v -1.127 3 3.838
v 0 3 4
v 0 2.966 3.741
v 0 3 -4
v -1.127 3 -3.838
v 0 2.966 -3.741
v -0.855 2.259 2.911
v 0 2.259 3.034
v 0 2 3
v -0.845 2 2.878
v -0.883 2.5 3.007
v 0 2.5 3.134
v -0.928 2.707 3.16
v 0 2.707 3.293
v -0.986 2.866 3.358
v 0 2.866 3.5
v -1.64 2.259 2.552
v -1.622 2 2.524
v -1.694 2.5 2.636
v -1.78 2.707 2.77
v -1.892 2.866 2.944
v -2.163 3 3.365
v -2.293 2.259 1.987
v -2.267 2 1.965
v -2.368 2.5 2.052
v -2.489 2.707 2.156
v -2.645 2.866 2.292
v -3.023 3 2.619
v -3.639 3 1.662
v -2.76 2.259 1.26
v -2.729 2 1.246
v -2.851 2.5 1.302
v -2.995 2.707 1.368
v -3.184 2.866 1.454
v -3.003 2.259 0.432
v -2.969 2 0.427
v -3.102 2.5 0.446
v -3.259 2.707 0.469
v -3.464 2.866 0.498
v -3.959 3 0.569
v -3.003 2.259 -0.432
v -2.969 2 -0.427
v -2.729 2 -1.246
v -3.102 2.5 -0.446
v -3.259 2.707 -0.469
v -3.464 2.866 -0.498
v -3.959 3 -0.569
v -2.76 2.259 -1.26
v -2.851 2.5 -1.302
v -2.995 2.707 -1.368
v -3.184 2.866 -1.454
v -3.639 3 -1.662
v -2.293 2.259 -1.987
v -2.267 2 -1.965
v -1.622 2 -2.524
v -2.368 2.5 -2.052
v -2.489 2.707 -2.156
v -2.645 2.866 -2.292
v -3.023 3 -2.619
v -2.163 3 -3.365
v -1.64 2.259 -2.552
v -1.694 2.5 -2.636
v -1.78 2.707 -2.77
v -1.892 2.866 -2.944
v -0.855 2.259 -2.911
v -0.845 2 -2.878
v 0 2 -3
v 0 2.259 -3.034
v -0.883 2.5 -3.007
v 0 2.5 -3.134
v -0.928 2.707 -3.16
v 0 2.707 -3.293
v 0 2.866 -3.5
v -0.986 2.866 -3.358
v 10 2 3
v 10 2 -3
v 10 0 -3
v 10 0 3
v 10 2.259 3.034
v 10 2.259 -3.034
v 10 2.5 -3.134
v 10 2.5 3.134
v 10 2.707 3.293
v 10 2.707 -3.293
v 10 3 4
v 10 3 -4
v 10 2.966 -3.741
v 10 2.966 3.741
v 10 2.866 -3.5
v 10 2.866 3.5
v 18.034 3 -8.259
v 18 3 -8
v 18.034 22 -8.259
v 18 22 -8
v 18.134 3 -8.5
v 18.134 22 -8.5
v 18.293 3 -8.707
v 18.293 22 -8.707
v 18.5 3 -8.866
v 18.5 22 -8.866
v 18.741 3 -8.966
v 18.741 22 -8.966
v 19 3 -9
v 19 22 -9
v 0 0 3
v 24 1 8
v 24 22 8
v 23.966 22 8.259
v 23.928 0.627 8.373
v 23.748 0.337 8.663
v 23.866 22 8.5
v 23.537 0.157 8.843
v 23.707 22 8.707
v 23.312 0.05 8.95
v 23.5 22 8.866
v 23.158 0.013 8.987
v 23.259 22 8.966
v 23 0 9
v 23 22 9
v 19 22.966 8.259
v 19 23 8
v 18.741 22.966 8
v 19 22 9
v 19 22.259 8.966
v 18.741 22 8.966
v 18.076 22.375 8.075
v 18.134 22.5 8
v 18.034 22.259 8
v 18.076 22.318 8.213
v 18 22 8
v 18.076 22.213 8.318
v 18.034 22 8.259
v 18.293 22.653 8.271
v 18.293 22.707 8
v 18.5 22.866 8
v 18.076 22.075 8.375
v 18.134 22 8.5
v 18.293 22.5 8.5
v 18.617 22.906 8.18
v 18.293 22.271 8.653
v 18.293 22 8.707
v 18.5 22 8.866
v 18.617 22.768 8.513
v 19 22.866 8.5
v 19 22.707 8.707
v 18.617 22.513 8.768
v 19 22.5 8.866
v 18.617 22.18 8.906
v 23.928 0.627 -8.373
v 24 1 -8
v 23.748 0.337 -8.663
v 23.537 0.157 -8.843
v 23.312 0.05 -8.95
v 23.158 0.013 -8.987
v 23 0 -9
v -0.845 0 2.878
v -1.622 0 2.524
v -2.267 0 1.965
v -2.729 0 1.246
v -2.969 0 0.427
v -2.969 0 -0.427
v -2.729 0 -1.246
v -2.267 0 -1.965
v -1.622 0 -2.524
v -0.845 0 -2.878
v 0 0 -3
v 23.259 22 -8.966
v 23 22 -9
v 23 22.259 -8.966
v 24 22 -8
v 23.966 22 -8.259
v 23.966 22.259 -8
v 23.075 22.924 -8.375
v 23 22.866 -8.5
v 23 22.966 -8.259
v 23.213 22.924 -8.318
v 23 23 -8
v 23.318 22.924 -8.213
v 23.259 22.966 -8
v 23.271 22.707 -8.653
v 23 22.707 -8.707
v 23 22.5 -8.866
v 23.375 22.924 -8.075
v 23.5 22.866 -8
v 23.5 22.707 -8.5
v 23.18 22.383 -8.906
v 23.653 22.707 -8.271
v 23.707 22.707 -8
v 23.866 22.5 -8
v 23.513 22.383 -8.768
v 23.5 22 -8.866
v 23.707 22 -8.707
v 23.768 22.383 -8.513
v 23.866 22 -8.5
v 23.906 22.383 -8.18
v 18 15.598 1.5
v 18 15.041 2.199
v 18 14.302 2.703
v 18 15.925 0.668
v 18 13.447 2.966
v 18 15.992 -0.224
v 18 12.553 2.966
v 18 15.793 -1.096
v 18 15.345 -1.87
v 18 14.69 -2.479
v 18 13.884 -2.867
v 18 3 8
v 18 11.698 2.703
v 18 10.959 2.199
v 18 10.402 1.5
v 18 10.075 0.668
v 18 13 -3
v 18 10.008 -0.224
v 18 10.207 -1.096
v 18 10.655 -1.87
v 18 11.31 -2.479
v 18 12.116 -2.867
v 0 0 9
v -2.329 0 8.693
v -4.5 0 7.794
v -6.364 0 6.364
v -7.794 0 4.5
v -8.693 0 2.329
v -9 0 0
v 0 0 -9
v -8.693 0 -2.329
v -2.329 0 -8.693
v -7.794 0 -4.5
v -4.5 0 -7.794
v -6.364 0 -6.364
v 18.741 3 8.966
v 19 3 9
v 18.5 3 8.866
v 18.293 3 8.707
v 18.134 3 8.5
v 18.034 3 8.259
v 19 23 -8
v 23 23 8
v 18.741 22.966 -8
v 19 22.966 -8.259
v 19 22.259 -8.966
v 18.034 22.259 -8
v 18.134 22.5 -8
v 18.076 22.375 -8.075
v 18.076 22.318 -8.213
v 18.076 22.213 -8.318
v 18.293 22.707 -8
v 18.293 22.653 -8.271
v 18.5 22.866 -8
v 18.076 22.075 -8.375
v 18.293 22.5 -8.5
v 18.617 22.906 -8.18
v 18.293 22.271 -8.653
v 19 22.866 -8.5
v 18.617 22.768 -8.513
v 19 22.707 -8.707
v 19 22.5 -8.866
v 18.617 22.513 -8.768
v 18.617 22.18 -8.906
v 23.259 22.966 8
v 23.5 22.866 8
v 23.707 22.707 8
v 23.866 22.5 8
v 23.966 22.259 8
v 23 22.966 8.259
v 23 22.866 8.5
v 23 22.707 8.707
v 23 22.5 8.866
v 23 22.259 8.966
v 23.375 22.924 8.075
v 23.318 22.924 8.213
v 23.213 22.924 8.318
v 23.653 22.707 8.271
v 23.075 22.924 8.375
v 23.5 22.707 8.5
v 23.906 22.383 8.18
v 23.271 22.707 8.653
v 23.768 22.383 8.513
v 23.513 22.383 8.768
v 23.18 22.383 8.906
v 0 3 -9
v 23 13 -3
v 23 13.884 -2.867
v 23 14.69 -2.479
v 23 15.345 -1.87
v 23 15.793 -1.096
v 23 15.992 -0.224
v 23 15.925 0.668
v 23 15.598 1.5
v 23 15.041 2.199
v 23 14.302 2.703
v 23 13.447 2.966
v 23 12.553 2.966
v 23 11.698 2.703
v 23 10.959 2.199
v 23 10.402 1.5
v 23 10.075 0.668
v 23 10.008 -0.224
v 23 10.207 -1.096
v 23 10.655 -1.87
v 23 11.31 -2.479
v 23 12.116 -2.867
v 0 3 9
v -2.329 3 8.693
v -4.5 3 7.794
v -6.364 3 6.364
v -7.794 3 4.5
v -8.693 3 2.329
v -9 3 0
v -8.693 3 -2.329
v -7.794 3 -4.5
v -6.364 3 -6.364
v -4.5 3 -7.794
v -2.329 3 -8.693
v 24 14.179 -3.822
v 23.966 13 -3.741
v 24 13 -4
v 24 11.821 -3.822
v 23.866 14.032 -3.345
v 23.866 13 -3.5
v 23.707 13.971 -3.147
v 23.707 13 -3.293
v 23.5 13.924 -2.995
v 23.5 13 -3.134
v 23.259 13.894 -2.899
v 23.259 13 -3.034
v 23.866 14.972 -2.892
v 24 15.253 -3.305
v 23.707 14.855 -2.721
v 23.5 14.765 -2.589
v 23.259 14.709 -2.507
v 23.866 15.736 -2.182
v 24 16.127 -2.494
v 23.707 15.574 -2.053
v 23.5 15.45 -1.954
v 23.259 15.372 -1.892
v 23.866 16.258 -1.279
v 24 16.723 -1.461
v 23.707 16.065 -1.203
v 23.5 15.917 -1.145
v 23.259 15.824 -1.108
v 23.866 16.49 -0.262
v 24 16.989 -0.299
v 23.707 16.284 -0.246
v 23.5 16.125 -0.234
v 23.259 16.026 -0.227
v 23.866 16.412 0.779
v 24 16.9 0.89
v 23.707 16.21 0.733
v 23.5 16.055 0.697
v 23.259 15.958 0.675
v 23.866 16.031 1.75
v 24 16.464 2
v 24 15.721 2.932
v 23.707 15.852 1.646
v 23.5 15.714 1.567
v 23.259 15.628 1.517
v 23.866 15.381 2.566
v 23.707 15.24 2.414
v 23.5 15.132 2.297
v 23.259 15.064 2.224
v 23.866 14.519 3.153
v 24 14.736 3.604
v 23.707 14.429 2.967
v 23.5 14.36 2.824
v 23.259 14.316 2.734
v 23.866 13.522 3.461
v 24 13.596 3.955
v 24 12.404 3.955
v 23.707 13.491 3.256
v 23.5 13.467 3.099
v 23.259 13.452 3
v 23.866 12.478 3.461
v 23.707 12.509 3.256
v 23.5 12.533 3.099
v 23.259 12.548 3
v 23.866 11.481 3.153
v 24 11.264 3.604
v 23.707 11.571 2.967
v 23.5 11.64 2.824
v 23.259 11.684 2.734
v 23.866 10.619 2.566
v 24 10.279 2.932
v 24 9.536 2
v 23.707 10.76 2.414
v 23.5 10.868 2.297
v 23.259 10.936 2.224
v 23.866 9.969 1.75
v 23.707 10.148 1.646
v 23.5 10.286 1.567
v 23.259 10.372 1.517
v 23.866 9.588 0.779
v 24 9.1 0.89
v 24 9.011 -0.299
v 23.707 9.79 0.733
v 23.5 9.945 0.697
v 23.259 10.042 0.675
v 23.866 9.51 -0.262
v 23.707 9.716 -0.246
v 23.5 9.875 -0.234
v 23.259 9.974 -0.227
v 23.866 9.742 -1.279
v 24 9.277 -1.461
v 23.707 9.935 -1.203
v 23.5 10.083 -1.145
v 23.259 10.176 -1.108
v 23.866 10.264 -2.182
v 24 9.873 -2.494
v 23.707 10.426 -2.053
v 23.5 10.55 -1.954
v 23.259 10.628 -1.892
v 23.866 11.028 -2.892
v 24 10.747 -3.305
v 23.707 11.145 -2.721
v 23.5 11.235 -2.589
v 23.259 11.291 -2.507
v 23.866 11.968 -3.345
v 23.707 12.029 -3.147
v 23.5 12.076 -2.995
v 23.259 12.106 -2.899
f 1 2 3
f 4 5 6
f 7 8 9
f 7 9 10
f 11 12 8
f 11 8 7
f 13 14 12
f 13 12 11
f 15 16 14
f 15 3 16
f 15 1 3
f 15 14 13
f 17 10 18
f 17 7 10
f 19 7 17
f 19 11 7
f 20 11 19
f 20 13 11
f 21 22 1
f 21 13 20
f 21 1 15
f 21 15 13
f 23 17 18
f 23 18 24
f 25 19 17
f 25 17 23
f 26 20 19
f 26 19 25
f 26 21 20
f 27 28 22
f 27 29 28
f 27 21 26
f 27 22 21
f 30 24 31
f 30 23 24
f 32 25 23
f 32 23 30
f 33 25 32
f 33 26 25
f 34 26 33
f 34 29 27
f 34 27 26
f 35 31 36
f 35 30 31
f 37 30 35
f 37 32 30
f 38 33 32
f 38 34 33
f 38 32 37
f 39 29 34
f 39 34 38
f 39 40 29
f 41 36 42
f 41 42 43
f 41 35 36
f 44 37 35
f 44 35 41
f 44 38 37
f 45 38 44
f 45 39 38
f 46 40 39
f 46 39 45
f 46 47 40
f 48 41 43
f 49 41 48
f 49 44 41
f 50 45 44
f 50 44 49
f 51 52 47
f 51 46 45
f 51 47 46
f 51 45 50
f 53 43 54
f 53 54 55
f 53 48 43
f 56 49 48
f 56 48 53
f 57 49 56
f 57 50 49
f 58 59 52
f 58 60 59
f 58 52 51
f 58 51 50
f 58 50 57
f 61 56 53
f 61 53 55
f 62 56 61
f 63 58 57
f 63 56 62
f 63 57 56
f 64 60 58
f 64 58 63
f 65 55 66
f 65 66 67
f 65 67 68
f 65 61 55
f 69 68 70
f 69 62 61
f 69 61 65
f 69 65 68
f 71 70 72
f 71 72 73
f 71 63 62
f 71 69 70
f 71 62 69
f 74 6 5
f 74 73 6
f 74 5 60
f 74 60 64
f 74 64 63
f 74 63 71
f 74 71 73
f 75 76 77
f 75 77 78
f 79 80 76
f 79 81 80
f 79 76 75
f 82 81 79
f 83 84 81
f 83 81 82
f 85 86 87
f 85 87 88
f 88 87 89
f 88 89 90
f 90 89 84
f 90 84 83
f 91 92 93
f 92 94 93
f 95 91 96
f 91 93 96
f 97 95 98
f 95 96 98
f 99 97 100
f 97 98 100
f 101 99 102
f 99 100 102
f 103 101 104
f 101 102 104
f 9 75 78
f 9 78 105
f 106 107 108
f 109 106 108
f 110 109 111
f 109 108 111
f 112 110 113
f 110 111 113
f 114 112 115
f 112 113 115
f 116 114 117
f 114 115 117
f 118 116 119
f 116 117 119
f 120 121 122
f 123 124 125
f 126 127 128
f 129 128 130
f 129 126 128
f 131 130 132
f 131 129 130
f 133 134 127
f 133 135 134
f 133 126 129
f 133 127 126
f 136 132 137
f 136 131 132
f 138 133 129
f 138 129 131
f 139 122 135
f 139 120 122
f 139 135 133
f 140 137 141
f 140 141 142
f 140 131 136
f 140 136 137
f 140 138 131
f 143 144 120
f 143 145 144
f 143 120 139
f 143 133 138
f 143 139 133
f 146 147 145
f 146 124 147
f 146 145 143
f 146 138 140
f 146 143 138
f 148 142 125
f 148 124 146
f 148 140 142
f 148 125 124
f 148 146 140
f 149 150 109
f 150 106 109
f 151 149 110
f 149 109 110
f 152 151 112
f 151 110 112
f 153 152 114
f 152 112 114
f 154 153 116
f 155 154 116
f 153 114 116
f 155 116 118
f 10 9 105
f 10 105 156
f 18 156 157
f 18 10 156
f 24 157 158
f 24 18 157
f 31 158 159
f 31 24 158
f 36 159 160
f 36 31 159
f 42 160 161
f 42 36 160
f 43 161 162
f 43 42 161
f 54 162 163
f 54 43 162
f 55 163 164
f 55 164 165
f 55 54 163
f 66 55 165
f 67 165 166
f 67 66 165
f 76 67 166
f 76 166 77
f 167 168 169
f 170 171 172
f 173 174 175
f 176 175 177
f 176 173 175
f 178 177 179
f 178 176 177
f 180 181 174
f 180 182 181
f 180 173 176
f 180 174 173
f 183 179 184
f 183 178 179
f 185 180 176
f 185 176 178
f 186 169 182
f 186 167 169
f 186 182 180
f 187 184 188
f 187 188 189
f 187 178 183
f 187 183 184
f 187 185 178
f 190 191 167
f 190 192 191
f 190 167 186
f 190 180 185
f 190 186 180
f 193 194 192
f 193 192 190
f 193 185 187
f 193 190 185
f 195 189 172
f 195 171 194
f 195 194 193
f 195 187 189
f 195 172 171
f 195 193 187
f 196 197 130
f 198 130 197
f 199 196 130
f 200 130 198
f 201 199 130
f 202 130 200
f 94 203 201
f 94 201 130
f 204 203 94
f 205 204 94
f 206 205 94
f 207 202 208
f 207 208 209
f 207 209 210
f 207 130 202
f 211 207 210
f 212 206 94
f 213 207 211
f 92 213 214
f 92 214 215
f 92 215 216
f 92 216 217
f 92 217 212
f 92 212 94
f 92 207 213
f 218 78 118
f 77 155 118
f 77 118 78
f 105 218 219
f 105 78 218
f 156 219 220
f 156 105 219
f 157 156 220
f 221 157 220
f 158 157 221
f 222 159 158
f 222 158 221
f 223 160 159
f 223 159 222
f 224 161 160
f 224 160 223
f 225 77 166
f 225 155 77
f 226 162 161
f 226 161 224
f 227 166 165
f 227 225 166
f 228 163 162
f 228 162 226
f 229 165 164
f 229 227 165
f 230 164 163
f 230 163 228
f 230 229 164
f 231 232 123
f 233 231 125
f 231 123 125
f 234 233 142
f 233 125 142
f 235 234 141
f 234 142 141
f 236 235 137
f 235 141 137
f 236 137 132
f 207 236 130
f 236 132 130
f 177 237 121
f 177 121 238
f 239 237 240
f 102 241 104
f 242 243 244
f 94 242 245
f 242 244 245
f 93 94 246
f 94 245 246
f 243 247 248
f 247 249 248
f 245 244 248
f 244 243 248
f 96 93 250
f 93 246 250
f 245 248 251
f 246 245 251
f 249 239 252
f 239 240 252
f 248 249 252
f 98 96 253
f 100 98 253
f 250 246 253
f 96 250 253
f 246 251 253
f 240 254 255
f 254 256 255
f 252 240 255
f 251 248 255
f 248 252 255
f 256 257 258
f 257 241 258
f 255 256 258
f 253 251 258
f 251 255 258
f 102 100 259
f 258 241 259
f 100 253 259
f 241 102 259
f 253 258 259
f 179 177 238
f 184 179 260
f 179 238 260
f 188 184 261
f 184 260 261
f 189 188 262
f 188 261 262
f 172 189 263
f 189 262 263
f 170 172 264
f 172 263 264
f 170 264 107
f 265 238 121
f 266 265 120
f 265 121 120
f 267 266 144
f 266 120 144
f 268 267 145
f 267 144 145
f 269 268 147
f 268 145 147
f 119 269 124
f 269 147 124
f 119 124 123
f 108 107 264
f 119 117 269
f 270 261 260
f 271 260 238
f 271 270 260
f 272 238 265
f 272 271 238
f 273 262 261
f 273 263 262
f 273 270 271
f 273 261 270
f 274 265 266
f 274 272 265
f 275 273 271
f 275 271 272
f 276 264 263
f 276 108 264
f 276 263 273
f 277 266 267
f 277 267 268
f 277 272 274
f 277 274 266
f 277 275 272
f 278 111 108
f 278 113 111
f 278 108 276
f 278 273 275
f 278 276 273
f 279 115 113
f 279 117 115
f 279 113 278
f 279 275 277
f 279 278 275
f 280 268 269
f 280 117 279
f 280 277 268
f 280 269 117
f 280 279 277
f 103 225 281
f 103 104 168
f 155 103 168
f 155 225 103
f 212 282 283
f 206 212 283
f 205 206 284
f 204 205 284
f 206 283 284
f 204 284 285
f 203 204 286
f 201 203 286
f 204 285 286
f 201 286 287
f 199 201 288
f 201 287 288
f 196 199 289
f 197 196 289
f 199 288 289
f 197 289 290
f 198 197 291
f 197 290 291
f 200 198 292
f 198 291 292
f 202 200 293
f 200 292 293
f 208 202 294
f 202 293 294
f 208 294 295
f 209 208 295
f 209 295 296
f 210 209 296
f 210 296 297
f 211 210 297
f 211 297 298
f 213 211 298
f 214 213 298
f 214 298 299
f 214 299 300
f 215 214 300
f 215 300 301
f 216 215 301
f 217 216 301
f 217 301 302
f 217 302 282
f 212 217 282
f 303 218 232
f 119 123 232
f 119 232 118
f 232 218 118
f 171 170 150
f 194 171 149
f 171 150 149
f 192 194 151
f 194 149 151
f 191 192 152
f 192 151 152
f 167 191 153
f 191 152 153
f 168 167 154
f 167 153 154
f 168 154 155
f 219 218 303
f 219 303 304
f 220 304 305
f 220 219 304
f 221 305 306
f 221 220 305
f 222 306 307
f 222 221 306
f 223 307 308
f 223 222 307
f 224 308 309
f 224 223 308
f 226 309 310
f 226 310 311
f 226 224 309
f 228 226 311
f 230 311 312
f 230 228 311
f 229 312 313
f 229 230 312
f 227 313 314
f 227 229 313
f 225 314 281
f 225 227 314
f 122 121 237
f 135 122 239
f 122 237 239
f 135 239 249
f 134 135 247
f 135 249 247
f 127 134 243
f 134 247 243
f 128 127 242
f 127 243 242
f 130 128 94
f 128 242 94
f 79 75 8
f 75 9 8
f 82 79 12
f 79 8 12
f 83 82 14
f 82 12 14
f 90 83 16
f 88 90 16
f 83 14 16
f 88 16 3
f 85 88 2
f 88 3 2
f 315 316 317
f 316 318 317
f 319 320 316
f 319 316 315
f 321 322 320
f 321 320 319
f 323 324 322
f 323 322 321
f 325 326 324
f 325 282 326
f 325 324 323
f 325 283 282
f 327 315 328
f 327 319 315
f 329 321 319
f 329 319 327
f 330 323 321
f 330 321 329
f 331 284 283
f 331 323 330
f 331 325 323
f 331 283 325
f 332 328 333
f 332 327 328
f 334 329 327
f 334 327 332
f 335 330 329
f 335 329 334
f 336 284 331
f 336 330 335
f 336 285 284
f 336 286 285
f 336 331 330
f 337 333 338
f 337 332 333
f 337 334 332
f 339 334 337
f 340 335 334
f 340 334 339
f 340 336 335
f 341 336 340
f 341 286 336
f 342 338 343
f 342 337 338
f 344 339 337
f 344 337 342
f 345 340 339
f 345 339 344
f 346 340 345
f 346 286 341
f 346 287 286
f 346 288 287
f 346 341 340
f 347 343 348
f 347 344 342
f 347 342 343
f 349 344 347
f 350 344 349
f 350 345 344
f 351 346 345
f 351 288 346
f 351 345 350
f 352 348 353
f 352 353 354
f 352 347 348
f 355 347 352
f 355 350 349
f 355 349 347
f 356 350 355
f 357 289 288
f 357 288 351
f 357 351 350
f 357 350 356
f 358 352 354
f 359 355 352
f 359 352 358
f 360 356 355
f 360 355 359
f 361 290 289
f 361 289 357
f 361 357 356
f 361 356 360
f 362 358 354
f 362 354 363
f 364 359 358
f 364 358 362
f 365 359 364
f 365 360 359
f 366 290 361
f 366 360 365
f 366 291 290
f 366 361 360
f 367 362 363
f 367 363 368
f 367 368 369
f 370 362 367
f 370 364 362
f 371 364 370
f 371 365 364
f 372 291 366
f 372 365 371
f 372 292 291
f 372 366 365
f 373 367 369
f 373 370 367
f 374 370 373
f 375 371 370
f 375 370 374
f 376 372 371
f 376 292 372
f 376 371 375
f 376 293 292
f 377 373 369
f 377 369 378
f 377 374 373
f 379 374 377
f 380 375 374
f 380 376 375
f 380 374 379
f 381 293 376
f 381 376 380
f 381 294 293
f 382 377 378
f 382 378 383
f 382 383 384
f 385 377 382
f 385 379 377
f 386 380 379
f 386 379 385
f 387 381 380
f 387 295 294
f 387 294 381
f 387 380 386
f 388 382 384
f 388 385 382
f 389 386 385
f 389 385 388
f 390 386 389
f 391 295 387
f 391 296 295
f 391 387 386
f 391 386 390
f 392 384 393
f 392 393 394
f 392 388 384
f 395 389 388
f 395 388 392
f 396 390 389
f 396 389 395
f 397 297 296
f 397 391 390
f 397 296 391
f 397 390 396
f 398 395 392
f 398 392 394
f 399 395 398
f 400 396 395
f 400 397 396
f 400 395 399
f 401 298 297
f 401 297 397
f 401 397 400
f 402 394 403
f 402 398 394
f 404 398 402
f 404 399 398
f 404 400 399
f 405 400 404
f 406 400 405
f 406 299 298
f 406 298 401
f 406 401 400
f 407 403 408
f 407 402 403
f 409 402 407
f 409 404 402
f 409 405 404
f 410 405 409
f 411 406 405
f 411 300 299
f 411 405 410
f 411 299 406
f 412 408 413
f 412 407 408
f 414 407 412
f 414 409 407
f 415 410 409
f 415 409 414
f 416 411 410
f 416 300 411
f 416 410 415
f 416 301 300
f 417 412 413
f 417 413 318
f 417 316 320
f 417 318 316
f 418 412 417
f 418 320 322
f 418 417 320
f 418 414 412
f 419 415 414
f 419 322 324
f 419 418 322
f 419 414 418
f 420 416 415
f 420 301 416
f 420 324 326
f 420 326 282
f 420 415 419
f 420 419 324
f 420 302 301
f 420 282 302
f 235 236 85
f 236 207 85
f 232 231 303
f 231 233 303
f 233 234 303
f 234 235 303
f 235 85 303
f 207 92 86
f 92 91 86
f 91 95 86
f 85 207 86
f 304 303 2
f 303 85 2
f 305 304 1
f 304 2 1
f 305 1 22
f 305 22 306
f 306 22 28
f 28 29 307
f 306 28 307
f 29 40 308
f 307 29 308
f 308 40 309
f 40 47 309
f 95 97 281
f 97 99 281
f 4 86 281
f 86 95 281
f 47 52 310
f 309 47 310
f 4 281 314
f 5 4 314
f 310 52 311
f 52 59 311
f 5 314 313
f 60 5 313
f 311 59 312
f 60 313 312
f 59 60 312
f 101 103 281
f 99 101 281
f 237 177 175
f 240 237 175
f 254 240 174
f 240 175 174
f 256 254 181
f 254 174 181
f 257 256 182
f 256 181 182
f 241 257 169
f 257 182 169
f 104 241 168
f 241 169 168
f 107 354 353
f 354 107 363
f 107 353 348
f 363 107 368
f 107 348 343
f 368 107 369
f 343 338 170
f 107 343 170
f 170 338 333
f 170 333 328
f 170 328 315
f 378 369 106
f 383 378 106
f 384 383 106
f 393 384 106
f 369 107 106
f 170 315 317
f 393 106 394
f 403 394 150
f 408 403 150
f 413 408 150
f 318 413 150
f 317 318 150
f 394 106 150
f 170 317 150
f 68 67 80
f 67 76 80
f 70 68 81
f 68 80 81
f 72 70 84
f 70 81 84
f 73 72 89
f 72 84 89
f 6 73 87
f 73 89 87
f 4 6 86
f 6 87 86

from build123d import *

# Parameters (mm, degrees)
BOSS_EXTRUDE1_DEPTH = 3
CUT_EXTRUDE1_DEPTH  = 3
SKETCH3_W           = 6
SKETCH3_H           = 18
BOSS_EXTRUDE2_DEPTH = 20
FILLET1_R           = 1
FILLET3_R           = 1
FILLET6_R           = 1
SKETCH4_R           = 3
CUT_EXTRUDE2_DEPTH  = 42.218927691
FILLET7_R           = 1


with BuildPart() as part:
    # Sketch1 → Boss-Extrude1 (new body)
    with BuildSketch(Plane(origin=(0, 0, 0), x_dir=(1, 0, 0), z_dir=(0, 1, 0))):
        with BuildLine():
            Line((0, 9), (24, 9))
            Line((24, 9), (24, -9))
            Line((24, -9), (0, -9))
            ThreePointArc((0, -9), (-9, 0), (0, 9))
        make_face()
    extrude(amount=BOSS_EXTRUDE1_DEPTH)

    # Sketch2 → Cut-Extrude1 (cut)
    with BuildSketch(Plane(origin=(0, 3, 0), x_dir=(1, 0, 0), z_dir=(0, 1, 0))):
        with BuildLine():
            Line((0, 3), (10, 3))
            Line((10, 3), (10, -3))
            Line((10, -3), (0, -3))
            ThreePointArc((0, -3), (-3, 0), (0, 3))
        make_face()
    extrude(amount=-CUT_EXTRUDE1_DEPTH, mode=Mode.SUBTRACT)

    # Sketch3 → Boss-Extrude2 (add)
    with BuildSketch(Plane(origin=(0, 3, 0), x_dir=(1, 0, 0), z_dir=(0, 1, 0))):
        with Locations((21, 0)):
            Rectangle(SKETCH3_W, SKETCH3_H)
    extrude(amount=BOSS_EXTRUDE2_DEPTH)

    # Fillet1
    fillet1_edges = [part.edges().sort_by_distance(p)[0] for p in [
        (24, 0, 0),
        (24, 11.5, 9),
        (24, 11.5, -9),
    ]]
    fillet(fillet1_edges, radius=FILLET1_R)

    # Fillet3
    fillet3_edges = [part.edges().sort_by_distance(p)[0] for p in [
        (23.707106781, 23, 8.707106781),
        (23.707106781, 23, -8.707106781),
        (18, 23, 0),
        (20.5, 23, -9),
        (20.5, 23, 9),
        (24, 23, 0),
        (18, 13, 9),
        (18, 13, -9),
    ]]
    fillet(fillet3_edges, radius=FILLET3_R)

    # Fillet6
    fillet6_edges = [part.edges().sort_by_distance(p)[0] for p in [
        (-3, 3, 0),
        (5, 3, 3),
        (5, 3, -3),
    ]]
    fillet(fillet6_edges, radius=FILLET6_R)

    # Sketch4 → Cut-Extrude2 (cut, through all)
    with BuildSketch(Plane(origin=(24, 0, 0), x_dir=(0, 0, -1), z_dir=(1, 0, 0))):
        with Locations((0, 13)):
            Circle(SKETCH4_R)
    extrude(amount=-CUT_EXTRUDE2_DEPTH, mode=Mode.SUBTRACT)

    # Fillet7
    fillet7_edges = [part.edges().sort_by_distance(p)[0] for p in [
        (24, 13, 3),
    ]]
    fillet(fillet7_edges, radius=FILLET7_R)


solid = part.part
